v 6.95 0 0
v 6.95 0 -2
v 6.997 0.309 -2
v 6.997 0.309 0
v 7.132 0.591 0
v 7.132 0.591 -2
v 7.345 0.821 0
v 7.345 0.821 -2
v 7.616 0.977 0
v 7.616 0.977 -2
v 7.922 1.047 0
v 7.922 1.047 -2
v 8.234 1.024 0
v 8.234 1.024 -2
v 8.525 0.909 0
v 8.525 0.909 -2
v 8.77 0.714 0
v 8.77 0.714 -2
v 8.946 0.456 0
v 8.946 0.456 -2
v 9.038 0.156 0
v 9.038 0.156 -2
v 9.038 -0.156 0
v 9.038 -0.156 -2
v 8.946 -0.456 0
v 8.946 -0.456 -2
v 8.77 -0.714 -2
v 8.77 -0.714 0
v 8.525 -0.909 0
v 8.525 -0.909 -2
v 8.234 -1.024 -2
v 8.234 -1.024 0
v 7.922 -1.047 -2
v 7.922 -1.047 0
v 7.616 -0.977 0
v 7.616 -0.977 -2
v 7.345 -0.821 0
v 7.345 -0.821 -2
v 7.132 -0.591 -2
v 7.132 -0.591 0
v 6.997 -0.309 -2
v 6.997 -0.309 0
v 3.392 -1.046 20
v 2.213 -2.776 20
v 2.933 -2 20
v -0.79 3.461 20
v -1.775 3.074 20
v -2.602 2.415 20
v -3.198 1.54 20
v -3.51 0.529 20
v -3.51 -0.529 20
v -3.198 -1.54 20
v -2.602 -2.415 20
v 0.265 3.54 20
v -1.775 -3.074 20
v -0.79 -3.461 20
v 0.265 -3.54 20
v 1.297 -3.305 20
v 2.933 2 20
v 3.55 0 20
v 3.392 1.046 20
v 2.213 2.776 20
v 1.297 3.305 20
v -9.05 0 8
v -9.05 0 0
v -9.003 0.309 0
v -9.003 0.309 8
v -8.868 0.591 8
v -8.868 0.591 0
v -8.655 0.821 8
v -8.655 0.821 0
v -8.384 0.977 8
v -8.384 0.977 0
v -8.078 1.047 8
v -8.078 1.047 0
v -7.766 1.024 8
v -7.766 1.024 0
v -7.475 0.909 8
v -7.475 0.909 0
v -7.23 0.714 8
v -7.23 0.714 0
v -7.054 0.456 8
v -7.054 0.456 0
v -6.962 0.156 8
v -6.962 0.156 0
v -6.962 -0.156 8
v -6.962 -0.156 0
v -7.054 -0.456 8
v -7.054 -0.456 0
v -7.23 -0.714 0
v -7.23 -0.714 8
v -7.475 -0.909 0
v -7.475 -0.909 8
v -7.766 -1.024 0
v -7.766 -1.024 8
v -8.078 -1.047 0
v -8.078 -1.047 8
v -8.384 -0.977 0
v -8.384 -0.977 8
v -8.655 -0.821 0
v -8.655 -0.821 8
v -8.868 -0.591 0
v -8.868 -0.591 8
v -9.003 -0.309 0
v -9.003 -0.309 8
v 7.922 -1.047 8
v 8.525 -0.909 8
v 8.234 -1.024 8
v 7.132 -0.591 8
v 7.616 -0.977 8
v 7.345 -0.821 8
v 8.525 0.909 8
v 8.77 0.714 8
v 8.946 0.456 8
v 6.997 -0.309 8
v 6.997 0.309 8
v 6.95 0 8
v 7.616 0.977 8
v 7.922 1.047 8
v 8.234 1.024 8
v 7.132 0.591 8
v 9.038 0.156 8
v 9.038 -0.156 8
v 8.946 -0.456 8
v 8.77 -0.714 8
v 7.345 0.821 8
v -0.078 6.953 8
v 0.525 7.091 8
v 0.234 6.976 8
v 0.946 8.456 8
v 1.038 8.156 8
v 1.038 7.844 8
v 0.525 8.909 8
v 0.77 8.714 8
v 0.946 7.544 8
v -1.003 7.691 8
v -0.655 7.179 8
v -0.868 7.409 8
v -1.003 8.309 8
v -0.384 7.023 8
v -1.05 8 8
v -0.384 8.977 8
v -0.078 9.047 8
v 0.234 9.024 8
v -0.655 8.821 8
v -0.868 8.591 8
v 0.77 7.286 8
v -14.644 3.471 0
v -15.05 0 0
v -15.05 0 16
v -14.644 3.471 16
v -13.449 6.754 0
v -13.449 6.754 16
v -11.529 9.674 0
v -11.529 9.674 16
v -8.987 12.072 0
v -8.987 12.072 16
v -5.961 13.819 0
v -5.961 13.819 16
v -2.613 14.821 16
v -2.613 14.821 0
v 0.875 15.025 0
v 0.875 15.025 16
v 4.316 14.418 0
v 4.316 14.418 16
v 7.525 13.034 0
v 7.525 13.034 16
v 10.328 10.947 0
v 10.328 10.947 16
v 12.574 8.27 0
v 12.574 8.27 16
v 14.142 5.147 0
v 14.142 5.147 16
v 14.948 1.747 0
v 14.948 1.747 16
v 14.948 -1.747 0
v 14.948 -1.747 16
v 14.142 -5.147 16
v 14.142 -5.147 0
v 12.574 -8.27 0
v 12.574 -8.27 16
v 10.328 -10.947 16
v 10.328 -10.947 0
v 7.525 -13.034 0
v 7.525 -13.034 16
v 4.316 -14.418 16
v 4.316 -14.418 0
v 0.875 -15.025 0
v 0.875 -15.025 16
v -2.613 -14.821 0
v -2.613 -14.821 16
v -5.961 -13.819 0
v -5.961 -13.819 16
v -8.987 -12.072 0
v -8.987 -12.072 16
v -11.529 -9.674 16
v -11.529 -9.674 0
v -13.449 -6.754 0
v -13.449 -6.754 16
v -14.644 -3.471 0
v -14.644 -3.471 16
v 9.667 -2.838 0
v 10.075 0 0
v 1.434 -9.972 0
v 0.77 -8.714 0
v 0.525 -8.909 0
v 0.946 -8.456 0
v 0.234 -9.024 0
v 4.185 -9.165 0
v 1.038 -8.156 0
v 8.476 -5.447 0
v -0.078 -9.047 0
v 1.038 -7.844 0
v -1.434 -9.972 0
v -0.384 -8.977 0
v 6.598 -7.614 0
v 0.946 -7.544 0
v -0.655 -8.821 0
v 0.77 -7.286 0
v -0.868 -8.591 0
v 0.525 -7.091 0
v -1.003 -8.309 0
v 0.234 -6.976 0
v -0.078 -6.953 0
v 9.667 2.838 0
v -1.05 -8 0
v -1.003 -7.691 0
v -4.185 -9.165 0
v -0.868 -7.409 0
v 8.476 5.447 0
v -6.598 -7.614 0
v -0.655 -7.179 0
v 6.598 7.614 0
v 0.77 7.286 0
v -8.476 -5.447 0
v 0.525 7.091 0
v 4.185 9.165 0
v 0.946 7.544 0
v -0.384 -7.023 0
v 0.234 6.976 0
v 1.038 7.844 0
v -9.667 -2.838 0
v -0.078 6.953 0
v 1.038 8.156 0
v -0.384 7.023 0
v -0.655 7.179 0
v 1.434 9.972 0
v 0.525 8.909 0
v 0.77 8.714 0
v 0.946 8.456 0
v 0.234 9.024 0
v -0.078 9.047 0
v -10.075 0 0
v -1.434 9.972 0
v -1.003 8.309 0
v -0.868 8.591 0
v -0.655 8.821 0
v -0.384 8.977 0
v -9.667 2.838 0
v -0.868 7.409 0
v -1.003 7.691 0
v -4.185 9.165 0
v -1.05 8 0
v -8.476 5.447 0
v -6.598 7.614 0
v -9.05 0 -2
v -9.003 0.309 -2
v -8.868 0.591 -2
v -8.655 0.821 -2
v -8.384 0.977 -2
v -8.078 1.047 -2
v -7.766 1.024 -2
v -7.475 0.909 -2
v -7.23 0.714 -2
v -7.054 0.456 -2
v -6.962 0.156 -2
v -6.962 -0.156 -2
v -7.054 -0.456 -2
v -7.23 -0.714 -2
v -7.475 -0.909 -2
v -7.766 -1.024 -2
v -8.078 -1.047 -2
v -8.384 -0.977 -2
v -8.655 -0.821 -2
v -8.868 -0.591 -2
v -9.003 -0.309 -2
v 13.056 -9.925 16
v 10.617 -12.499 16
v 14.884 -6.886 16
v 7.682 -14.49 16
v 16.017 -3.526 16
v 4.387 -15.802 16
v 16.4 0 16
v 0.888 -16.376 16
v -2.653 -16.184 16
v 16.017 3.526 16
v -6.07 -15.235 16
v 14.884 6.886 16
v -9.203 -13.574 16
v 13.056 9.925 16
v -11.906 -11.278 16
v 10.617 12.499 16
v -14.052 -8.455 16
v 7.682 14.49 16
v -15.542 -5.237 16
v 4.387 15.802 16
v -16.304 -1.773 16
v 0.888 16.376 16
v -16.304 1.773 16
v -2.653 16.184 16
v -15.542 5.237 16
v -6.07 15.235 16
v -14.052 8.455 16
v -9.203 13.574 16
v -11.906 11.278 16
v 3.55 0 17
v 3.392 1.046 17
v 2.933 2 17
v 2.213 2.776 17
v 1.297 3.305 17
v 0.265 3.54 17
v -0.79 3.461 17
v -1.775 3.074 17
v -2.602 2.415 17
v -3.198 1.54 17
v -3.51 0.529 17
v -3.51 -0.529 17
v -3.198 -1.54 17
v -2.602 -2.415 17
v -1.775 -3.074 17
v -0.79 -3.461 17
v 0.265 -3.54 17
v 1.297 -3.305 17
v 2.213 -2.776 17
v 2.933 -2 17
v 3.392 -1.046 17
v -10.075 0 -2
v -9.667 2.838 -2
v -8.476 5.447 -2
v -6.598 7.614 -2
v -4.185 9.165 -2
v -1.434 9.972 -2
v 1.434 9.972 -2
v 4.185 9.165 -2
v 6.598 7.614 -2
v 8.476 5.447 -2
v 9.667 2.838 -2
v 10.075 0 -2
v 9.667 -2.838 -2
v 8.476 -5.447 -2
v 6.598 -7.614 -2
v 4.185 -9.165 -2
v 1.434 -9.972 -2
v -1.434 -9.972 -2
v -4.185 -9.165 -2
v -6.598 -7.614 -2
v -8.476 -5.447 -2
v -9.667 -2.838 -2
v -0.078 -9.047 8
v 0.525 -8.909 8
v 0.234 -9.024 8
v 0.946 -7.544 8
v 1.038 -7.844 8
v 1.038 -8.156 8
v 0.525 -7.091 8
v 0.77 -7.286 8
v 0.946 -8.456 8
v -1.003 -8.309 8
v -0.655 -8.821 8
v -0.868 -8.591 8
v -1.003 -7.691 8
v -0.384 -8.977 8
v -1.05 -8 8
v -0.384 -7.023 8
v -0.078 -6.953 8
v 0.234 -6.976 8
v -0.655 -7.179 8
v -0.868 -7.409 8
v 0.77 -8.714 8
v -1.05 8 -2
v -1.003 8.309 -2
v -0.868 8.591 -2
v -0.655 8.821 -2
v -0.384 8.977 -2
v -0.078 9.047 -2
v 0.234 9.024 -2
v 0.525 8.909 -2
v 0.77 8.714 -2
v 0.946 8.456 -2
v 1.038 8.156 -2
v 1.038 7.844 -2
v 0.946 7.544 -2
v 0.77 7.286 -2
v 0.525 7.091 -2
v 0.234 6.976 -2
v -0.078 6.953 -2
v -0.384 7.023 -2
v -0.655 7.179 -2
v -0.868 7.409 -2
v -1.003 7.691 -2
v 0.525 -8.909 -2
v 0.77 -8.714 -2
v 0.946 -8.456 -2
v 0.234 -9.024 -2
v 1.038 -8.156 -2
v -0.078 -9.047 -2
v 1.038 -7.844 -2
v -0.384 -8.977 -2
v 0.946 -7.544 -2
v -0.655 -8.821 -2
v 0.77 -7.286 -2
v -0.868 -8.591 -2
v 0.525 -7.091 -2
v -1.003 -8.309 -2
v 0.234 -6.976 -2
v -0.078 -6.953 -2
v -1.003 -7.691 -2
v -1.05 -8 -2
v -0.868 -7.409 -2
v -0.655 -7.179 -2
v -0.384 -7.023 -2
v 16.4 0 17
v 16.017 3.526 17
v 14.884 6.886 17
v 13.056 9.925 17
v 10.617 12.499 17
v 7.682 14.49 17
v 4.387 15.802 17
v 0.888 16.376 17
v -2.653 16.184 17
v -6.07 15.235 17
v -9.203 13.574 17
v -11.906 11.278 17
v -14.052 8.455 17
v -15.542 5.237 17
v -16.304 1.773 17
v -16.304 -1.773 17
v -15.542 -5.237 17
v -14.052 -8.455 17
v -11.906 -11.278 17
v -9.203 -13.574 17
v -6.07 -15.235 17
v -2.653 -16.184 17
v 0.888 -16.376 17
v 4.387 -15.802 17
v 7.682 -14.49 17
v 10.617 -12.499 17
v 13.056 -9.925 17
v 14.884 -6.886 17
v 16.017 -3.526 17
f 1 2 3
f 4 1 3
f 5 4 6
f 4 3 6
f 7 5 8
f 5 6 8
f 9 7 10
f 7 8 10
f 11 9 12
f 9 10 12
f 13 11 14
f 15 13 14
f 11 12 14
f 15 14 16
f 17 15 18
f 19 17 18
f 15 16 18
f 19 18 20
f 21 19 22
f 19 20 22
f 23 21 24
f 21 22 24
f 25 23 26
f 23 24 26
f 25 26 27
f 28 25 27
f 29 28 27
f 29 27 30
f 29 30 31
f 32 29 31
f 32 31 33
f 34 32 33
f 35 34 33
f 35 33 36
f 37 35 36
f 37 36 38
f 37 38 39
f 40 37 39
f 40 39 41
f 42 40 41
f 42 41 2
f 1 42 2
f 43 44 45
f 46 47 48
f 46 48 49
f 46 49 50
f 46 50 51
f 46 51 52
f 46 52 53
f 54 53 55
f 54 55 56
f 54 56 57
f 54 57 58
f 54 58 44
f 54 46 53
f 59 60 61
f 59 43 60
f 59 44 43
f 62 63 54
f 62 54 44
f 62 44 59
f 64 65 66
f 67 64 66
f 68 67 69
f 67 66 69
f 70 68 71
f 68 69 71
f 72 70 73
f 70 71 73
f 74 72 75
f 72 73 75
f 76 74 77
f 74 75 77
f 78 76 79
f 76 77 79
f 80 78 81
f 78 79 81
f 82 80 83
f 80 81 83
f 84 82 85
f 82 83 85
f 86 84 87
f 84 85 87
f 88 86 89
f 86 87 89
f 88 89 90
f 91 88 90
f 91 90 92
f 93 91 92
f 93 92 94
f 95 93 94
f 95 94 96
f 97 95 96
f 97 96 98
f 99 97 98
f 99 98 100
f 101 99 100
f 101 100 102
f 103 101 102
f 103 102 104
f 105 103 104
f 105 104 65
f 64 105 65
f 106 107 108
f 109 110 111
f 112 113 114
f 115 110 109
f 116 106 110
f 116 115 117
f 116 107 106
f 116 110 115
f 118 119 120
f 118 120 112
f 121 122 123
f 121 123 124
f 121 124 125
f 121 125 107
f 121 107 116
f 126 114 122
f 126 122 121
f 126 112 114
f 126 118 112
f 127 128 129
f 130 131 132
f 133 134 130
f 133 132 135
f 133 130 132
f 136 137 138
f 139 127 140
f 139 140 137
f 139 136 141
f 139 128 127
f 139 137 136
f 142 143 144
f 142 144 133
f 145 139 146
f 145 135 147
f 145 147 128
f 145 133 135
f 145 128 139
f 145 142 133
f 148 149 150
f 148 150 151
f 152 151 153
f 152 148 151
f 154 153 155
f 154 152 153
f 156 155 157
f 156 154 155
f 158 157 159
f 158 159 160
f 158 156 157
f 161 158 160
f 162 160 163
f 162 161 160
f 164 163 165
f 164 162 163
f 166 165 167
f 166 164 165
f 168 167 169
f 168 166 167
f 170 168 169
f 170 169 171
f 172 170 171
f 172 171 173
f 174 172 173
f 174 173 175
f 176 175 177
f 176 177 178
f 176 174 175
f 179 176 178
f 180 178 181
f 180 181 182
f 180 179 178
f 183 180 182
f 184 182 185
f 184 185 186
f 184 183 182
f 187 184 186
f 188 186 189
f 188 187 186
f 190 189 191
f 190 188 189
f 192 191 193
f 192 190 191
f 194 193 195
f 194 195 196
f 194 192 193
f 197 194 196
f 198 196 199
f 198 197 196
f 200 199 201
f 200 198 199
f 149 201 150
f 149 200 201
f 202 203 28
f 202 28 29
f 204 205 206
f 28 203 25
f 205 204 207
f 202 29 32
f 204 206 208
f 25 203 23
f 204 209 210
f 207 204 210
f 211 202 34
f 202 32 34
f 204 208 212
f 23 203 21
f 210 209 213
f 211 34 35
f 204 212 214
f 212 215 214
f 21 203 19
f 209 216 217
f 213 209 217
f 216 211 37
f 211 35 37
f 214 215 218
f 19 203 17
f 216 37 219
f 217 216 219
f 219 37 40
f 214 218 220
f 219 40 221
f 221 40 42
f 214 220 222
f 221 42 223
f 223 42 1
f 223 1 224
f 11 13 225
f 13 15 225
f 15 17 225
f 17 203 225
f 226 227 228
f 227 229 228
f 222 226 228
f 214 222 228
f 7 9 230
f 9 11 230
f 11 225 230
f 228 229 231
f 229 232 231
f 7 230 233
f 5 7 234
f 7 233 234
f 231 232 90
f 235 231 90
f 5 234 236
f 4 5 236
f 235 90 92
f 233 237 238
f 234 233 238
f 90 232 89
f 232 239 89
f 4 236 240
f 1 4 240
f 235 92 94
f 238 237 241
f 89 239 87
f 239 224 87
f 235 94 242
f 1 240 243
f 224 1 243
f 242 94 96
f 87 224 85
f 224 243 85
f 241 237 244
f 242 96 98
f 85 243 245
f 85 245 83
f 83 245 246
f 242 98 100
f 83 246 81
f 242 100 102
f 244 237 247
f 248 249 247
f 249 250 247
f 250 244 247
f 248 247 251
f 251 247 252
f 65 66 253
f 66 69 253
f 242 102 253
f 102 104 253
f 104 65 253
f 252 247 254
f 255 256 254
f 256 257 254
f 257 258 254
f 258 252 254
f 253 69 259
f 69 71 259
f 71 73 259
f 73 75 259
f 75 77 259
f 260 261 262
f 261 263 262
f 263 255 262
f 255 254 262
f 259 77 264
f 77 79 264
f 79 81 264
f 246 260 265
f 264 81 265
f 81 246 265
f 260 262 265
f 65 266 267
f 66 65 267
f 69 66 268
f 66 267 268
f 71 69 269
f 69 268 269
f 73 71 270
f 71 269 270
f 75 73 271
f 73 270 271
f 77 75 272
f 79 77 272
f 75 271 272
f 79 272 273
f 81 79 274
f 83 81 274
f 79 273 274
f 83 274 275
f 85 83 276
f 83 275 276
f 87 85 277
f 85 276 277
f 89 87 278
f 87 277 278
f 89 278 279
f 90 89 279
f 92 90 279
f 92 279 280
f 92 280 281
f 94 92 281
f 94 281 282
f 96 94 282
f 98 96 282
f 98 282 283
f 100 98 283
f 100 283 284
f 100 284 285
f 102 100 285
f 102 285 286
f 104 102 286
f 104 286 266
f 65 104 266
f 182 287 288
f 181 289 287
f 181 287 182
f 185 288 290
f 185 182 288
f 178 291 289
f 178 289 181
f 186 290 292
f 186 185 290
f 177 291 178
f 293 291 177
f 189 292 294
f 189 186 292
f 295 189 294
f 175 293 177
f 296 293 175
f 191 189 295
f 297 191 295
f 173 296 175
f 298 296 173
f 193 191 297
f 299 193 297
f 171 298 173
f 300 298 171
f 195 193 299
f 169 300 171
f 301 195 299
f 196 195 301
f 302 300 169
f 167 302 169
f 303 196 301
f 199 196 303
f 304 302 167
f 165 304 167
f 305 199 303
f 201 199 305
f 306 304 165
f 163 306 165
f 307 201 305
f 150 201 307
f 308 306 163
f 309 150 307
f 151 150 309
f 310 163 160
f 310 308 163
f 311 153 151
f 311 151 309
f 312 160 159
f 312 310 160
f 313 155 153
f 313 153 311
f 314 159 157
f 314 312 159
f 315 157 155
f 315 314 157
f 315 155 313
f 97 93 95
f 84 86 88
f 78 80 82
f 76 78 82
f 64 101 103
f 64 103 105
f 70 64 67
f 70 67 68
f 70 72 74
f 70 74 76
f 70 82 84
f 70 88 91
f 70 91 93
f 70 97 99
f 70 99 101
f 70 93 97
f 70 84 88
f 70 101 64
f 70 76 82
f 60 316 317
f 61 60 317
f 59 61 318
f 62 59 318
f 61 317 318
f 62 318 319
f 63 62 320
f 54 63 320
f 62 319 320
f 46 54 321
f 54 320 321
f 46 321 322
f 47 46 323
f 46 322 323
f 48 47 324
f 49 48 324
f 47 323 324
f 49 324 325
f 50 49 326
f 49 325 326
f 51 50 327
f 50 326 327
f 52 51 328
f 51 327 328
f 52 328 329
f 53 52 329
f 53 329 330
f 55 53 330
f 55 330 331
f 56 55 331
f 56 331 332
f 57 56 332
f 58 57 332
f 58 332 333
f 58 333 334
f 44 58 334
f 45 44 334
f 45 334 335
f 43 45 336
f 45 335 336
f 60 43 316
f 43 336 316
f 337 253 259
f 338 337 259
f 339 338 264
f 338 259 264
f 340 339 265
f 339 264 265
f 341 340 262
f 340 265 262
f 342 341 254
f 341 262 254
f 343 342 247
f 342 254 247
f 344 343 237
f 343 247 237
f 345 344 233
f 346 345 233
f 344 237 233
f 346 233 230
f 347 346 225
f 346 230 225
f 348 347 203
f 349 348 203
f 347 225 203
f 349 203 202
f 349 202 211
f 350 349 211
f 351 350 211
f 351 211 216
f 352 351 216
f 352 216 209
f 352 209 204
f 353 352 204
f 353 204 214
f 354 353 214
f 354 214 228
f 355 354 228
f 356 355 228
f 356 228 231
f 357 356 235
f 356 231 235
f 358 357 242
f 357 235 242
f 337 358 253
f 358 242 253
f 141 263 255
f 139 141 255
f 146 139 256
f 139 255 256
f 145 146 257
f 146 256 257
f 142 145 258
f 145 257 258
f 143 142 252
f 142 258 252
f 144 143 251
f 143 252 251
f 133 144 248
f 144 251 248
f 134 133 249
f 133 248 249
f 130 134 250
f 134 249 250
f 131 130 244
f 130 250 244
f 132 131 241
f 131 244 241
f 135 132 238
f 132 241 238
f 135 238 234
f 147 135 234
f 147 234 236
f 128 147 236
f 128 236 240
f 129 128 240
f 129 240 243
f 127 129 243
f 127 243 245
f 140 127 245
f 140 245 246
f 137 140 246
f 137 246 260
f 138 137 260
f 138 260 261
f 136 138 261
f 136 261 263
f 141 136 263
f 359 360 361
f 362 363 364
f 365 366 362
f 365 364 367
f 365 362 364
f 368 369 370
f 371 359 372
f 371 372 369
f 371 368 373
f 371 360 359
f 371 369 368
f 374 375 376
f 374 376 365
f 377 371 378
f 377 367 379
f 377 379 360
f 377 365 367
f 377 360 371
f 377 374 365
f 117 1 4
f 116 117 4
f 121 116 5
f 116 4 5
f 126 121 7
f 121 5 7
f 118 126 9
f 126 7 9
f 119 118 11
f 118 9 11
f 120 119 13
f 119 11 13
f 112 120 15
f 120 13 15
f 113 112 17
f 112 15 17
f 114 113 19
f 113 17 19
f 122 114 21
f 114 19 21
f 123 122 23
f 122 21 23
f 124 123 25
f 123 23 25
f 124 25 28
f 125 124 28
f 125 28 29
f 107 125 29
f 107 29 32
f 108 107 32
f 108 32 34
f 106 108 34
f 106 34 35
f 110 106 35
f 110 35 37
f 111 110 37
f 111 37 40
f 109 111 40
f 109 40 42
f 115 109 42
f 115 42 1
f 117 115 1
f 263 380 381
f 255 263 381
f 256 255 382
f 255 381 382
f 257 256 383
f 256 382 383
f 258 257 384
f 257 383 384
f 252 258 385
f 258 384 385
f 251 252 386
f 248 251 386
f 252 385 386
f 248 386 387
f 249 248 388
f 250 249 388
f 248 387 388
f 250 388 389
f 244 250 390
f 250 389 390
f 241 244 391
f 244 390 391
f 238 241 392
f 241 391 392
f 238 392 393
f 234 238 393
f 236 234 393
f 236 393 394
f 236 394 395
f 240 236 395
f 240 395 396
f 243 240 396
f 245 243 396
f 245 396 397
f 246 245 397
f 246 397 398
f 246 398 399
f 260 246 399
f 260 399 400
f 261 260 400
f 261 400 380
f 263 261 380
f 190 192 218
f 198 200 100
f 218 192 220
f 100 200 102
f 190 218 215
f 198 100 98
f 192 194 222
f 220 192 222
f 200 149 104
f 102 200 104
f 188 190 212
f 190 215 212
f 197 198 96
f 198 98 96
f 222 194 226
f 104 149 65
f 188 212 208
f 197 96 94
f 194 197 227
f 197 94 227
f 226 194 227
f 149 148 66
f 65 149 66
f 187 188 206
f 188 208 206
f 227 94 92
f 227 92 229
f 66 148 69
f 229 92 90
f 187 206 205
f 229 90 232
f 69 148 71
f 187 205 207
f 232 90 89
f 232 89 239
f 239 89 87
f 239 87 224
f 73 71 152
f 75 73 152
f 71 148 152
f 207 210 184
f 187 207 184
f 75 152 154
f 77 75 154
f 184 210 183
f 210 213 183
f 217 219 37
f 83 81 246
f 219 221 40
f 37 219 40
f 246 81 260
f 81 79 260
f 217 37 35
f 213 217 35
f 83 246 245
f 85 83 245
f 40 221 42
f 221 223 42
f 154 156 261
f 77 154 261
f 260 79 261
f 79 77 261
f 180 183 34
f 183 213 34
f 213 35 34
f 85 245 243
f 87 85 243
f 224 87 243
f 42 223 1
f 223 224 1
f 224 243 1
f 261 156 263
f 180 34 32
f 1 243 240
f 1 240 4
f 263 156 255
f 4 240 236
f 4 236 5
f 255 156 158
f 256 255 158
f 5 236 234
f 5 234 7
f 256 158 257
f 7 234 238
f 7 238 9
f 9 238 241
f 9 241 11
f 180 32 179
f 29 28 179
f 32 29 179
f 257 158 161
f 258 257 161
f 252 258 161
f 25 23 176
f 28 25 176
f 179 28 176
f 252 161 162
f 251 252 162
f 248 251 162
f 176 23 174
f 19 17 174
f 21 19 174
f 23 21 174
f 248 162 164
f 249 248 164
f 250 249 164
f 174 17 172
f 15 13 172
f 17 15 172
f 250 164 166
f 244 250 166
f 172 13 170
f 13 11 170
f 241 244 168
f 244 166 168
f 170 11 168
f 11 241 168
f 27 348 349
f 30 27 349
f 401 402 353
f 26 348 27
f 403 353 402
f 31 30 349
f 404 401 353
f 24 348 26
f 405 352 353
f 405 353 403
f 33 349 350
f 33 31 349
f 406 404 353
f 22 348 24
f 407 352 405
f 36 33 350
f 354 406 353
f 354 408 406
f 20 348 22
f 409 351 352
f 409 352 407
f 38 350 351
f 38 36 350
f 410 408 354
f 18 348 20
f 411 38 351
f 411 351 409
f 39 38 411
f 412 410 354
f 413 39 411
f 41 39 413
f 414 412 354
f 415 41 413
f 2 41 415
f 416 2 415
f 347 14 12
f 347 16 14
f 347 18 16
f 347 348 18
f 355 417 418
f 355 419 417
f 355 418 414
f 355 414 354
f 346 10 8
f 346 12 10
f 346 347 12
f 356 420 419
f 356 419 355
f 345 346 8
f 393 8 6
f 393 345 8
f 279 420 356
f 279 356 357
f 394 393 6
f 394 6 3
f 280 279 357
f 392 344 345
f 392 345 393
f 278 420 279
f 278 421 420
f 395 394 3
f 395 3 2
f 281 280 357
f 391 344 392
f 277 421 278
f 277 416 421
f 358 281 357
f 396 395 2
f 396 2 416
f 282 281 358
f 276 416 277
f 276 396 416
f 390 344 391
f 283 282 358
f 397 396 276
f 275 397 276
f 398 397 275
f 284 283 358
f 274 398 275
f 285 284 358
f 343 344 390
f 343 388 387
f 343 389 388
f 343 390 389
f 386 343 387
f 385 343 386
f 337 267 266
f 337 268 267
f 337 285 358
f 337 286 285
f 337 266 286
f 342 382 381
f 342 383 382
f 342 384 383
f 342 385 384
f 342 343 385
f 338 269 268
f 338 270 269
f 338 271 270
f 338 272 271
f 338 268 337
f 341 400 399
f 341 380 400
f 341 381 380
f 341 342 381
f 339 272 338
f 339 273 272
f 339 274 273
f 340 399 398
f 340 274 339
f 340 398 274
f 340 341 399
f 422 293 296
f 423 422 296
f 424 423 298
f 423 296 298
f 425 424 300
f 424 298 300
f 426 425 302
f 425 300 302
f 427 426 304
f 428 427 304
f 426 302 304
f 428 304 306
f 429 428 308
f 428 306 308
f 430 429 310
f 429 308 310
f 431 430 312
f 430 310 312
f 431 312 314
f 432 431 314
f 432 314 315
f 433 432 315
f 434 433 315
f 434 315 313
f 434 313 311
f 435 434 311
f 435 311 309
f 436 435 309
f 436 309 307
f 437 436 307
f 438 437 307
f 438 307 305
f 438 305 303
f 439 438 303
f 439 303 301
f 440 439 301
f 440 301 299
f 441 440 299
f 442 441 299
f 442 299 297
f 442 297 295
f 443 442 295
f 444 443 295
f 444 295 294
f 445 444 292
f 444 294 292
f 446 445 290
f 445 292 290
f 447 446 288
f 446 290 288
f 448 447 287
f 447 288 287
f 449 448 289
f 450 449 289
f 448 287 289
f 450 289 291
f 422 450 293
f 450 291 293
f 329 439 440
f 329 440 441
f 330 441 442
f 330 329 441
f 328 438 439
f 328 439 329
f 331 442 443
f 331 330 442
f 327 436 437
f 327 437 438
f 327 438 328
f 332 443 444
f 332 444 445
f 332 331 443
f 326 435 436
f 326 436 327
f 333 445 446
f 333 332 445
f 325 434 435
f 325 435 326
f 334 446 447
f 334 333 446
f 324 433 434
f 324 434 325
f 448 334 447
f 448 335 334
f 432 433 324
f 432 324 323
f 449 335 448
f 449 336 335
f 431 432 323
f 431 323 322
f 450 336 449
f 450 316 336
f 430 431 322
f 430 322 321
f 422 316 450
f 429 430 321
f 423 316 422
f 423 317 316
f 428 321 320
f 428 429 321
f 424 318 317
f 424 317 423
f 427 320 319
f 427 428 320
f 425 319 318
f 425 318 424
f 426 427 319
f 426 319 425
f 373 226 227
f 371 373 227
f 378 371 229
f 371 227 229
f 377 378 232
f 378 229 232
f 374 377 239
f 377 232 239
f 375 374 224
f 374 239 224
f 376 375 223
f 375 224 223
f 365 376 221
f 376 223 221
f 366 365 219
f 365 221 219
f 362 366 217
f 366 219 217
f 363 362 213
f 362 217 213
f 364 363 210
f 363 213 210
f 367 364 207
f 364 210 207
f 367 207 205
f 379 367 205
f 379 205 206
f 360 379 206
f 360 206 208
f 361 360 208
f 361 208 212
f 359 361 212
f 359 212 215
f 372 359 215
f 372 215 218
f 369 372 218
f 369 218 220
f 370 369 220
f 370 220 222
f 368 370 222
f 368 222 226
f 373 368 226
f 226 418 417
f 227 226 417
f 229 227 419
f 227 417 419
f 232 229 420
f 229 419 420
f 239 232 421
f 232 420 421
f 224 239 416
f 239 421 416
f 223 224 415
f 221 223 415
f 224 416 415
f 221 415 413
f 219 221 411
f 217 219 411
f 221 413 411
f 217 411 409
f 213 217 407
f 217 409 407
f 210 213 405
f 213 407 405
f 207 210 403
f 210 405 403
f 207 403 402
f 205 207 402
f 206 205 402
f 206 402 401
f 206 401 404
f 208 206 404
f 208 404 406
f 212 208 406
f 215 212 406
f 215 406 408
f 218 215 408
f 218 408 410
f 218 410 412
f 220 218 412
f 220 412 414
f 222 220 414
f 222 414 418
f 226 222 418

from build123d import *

# Parameters (mm, degrees)
SKETCH_1_R          = 16.4
EXTRUDE_1_DEPTH     = 17
SKETCH_2_R          = 3.55
EXTRUDE_2_DEPTH     = 3
SKETCH_3_R          = 10.075
EXTRUDE_3_DEPTH     = 2
SKETCH_7_R          = 1.05
CUT_EXTRUDE_3_DEPTH = 10
SKETCH3_R           = 16.4
SKETCH3_R_2         = 15.05
CUT_EXTRUDE3_DEPTH  = 16


with BuildPart() as part:
    # 草图1 → 凸台-拉伸1 (new body)
    with BuildSketch(Plane.XY):
        Circle(SKETCH_1_R)
    extrude(amount=EXTRUDE_1_DEPTH)

    # 草图2 → 凸台-拉伸2 (add)
    with BuildSketch(Plane.XY.offset(17)):
        Circle(SKETCH_2_R)
    extrude(amount=EXTRUDE_2_DEPTH)


with BuildPart() as body_2:
    # 草图3 → 凸台-拉伸3 (new body)
    with BuildSketch(Plane(origin=(0, 0, 0), x_dir=(-1, 0, 0), z_dir=(0, 0, -1))):
        Circle(SKETCH_3_R)
    extrude(amount=EXTRUDE_3_DEPTH)


with BuildPart() as cut_extrude_3_tool:
    # 草图7 → 切除-拉伸3 (new body)
    with BuildSketch(Plane(origin=(0, 0, -2), x_dir=(-1, 0, 0), z_dir=(0, 0, -1))):
        with Locations((0, 8)):
            Circle(SKETCH_7_R)
        with Locations((8, 0)):
            Circle(SKETCH_7_R)
        with Locations((0, -8)):
            Circle(SKETCH_7_R)
        with Locations((-8, 0)):
            Circle(SKETCH_7_R)
    extrude(amount=-CUT_EXTRUDE_3_DEPTH)


with BuildPart() as part_1:
    add(part.part)

    # 切除-拉伸3: cut by cut_extrude_3_tool
    add(cut_extrude_3_tool.part, mode=Mode.SUBTRACT)

    # Sketch3 → Cut-Extrude3 (cut)
    with BuildSketch(Plane(origin=(0, 0, 0), x_dir=(-1, 0, 0), z_dir=(0, 0, -1))):
        Circle(SKETCH3_R)
        Circle(SKETCH3_R_2, mode=Mode.SUBTRACT)
    extrude(amount=-CUT_EXTRUDE3_DEPTH, mode=Mode.SUBTRACT)


with BuildPart() as body_2_1:
    add(body_2.part)

    # 切除-拉伸3: cut by cut_extrude_3_tool
    add(cut_extrude_3_tool.part, mode=Mode.SUBTRACT)


solid = Compound([part_1.part, body_2_1.part])
